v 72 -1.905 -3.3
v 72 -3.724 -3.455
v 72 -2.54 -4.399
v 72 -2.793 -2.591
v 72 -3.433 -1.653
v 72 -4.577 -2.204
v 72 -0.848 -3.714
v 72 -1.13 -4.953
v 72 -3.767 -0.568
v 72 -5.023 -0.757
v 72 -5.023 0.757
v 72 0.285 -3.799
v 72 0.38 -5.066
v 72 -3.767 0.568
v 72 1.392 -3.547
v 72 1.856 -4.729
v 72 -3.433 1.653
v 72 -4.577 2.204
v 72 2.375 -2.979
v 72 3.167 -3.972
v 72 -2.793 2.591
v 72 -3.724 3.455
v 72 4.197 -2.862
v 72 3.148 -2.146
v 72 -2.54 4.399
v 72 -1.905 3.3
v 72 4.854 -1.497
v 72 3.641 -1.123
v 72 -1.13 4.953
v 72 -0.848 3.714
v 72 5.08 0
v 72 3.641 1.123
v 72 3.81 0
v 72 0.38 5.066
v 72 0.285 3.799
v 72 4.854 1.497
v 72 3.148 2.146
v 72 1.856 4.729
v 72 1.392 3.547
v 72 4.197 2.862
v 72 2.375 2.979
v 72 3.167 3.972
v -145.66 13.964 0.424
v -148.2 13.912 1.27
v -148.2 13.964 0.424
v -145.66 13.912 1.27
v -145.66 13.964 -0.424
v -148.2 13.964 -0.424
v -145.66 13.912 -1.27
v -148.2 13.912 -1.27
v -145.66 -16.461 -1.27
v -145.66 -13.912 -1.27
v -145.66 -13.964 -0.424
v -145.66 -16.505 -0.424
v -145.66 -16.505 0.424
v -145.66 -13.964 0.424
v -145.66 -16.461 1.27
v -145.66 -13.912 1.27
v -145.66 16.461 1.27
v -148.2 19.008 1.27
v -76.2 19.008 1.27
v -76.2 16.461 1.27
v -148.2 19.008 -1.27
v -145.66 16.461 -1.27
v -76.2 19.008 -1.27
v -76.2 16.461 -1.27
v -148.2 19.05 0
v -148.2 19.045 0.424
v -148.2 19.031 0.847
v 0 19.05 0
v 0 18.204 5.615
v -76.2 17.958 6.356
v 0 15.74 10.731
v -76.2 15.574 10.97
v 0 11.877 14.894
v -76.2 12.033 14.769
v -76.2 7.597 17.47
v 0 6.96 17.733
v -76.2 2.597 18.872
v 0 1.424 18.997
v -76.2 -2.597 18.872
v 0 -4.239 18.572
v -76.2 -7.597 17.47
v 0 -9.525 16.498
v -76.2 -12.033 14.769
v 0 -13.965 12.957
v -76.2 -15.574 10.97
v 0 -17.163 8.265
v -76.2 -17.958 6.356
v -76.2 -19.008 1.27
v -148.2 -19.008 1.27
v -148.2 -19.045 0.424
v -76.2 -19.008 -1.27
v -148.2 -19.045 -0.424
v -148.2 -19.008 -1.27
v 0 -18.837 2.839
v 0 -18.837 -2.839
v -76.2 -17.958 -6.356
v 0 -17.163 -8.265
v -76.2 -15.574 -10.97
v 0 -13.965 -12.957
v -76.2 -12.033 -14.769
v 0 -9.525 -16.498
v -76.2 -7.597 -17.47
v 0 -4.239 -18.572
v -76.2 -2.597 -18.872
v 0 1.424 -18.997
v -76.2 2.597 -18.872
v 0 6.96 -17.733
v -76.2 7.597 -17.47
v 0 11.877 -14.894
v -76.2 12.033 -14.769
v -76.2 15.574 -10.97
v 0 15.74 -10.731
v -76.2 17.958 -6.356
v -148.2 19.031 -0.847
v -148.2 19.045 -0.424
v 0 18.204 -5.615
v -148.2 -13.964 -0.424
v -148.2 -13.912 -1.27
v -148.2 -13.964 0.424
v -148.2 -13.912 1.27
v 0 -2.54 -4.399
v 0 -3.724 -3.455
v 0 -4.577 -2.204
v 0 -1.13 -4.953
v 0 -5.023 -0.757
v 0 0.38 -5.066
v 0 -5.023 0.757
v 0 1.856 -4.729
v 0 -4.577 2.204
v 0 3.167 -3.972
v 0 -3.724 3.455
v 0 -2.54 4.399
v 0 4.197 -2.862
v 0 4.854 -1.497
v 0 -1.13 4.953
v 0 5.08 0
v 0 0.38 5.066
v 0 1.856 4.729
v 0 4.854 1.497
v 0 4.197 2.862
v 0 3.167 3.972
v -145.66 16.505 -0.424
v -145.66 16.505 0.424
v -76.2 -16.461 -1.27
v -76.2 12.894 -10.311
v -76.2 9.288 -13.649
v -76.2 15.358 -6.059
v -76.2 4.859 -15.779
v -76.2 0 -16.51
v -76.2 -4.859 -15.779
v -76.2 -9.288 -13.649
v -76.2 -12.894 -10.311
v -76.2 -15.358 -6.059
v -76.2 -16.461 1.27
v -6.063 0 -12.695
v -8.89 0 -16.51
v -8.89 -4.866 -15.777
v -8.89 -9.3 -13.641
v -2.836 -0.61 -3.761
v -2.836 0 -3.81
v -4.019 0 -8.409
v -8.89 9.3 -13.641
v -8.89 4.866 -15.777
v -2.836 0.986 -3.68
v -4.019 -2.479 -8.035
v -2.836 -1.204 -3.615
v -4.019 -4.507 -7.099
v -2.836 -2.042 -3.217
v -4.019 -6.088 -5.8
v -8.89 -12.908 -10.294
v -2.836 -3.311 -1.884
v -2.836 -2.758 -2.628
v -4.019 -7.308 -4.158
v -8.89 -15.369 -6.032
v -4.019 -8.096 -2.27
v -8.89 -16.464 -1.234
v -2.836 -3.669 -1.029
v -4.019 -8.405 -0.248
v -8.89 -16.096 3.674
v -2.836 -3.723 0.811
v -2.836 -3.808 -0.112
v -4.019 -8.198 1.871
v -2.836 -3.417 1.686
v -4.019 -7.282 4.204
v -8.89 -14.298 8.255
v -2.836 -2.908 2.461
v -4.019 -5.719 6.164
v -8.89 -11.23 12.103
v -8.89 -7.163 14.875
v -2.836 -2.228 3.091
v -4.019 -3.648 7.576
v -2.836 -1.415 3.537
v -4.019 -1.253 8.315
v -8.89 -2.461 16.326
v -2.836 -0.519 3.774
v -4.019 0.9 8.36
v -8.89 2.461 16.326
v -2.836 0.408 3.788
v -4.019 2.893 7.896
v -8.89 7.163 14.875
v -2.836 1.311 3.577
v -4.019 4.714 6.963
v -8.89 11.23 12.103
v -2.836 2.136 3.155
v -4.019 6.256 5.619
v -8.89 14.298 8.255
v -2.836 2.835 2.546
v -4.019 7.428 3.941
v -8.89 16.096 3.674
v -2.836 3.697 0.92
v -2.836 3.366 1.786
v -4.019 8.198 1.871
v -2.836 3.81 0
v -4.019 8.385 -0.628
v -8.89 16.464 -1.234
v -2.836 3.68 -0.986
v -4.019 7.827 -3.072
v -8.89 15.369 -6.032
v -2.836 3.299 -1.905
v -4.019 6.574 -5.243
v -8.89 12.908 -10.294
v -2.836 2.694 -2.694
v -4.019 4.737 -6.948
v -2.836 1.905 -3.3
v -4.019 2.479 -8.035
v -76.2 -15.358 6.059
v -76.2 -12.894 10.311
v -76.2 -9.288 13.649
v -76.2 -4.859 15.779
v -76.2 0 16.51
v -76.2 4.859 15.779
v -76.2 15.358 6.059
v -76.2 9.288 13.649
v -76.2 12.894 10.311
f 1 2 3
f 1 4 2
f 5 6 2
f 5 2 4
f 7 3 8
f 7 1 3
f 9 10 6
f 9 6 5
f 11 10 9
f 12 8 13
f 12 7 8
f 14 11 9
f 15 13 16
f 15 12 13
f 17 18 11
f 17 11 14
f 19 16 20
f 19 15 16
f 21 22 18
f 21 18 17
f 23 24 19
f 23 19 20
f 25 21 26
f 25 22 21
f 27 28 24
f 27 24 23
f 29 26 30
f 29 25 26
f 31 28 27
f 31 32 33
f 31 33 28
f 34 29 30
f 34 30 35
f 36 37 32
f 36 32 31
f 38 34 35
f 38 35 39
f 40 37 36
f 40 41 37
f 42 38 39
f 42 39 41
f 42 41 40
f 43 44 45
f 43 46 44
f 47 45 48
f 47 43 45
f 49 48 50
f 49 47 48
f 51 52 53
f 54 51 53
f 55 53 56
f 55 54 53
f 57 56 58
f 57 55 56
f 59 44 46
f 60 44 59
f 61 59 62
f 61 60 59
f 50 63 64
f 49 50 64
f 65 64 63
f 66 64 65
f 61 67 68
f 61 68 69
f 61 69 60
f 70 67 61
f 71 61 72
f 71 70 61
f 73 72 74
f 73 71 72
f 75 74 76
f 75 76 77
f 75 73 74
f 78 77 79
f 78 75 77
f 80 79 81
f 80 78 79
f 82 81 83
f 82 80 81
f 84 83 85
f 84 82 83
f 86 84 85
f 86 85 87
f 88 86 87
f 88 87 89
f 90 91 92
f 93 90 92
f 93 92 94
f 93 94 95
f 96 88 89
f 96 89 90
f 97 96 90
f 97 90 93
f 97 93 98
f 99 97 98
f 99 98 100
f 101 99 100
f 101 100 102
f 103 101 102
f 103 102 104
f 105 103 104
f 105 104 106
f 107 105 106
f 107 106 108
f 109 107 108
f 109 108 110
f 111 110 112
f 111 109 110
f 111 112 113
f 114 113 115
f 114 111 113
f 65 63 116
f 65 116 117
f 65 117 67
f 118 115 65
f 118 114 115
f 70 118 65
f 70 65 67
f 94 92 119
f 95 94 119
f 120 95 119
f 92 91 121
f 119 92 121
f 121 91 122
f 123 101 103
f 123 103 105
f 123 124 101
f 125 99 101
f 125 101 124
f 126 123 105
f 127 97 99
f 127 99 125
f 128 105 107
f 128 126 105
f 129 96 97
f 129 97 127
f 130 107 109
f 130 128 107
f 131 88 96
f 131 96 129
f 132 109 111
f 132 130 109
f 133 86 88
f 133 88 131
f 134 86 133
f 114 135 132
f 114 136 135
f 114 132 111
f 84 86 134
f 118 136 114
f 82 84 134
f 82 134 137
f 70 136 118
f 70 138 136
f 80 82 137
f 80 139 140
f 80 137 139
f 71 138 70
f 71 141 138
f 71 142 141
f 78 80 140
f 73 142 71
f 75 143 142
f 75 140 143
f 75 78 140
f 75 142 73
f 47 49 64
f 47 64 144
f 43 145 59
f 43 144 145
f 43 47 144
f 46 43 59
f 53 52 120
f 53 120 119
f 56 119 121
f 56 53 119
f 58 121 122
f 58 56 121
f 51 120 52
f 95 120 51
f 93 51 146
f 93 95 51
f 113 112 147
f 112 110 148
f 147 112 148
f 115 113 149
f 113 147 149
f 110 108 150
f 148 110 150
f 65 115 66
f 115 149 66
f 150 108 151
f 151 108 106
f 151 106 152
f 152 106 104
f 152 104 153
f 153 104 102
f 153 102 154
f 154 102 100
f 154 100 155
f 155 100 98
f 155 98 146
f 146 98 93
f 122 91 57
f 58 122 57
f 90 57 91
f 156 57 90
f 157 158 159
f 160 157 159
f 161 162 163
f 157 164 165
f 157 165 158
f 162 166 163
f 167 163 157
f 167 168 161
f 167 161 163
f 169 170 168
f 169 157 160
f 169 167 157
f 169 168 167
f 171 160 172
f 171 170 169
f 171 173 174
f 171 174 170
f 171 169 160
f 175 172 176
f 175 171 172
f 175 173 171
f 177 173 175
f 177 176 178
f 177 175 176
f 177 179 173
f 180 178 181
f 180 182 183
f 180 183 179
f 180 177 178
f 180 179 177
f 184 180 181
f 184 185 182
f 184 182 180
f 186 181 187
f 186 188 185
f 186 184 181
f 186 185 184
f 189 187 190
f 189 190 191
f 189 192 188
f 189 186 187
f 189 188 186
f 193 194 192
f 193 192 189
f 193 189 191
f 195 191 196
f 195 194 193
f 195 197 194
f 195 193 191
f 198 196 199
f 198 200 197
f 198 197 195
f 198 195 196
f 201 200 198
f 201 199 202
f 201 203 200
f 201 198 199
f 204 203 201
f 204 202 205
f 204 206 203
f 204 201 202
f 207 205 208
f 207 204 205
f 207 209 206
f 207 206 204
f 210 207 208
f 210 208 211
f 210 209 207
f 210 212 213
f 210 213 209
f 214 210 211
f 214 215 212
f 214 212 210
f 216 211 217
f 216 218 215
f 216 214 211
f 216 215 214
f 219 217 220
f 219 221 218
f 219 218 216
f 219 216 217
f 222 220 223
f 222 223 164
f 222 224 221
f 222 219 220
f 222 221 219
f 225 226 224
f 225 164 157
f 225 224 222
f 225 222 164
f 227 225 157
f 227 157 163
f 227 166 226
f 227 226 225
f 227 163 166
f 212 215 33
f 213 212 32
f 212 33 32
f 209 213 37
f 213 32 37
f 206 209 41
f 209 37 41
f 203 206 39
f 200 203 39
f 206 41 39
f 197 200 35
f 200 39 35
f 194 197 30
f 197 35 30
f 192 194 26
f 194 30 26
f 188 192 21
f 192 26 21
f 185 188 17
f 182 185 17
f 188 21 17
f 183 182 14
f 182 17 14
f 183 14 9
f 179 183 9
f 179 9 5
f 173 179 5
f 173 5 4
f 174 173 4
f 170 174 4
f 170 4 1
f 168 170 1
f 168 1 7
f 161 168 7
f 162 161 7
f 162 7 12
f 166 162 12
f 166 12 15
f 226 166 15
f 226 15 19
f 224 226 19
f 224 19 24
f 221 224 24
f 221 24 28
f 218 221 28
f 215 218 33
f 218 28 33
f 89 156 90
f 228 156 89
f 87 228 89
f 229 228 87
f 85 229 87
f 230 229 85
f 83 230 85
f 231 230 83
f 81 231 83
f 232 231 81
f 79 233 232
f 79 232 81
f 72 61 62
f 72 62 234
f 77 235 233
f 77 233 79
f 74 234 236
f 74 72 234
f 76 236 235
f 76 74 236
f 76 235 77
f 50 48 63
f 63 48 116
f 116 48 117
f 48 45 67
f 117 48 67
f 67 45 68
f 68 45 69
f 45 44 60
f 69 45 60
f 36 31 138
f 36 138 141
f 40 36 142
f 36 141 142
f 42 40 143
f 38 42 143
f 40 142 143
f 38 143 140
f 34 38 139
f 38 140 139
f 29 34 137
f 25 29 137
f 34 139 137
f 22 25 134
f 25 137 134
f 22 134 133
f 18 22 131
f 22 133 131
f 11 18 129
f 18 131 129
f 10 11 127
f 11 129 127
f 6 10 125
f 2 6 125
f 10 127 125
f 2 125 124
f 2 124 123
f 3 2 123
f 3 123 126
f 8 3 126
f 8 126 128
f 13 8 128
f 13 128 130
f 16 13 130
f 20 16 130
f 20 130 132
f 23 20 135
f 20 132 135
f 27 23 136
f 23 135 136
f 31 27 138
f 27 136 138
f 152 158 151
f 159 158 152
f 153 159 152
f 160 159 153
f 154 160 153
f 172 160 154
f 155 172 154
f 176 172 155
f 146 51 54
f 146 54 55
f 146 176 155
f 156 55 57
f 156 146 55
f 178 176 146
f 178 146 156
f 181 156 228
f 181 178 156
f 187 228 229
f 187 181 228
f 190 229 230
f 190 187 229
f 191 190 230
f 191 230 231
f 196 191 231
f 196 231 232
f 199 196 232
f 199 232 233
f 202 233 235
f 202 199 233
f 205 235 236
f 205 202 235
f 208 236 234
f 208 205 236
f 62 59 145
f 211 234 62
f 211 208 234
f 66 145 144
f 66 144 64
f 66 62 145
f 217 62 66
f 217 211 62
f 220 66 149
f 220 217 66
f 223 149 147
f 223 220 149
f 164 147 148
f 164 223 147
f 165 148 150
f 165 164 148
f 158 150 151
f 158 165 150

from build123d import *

# Parameters (mm, degrees)
F0_R     = 19.05
F1_DEPTH = 148.2
F4_W     = 101.6
F4_H     = 31.79568
F5_DEPTH = 25.4
F6_R     = 5.08
F7_DEPTH = 72
F8_R     = 3.81
F9_DEPTH = 152.4


with BuildPart() as f1:
    # F0 (on Right) → F1 (new body)
    with BuildSketch(Plane.YZ):
        Circle(F0_R)
    extrude(amount=-F1_DEPTH)

    # F2 (on Front) → F3 (revolve, cut)
    with BuildSketch(Plane.XZ):
        with BuildLine():
            ThreePointArc((-8.89, -16.51), (-4.182231, -8.844527), (-2.54, 0))
            Line((-2.54, 0), (-8.89, 0))
            Line((-8.89, 0), (-8.89, -16.51))
        make_face()
        Polygon((-8.89, -16.51), (-8.89, 0), (-148.2, 0), (-148.2, -13.97), (-145.66, -13.97), (-145.66, -16.51), (-76.2, -16.51), align=None)
    revolve(axis=Axis((-78.545, 0, 0), (-1, 0, 0)), mode=Mode.SUBTRACT)

    # F4 (on Front) → F5 (cut, symmetric)
    with BuildSketch(Plane.XZ):
        Polygon((-177.8, 1.27), (-76.2, 1.27), (-76.2, 26.052563), (-178.992286, 26.052563), align=None)
        with Locations((-127, -17.16784)):
            Rectangle(F4_W, F4_H)
    extrude(amount=F5_DEPTH, both=True, mode=Mode.SUBTRACT)

    # F6 (on face) → F7 (join)
    with BuildSketch(Plane.YZ):
        Circle(F6_R)
    extrude(amount=F7_DEPTH)

    # F8 (on face) → F9 (cut)
    with BuildSketch(Plane.YZ.offset(72)):
        Circle(F8_R)
    extrude(amount=-F9_DEPTH, mode=Mode.SUBTRACT)


solid = f1.part
